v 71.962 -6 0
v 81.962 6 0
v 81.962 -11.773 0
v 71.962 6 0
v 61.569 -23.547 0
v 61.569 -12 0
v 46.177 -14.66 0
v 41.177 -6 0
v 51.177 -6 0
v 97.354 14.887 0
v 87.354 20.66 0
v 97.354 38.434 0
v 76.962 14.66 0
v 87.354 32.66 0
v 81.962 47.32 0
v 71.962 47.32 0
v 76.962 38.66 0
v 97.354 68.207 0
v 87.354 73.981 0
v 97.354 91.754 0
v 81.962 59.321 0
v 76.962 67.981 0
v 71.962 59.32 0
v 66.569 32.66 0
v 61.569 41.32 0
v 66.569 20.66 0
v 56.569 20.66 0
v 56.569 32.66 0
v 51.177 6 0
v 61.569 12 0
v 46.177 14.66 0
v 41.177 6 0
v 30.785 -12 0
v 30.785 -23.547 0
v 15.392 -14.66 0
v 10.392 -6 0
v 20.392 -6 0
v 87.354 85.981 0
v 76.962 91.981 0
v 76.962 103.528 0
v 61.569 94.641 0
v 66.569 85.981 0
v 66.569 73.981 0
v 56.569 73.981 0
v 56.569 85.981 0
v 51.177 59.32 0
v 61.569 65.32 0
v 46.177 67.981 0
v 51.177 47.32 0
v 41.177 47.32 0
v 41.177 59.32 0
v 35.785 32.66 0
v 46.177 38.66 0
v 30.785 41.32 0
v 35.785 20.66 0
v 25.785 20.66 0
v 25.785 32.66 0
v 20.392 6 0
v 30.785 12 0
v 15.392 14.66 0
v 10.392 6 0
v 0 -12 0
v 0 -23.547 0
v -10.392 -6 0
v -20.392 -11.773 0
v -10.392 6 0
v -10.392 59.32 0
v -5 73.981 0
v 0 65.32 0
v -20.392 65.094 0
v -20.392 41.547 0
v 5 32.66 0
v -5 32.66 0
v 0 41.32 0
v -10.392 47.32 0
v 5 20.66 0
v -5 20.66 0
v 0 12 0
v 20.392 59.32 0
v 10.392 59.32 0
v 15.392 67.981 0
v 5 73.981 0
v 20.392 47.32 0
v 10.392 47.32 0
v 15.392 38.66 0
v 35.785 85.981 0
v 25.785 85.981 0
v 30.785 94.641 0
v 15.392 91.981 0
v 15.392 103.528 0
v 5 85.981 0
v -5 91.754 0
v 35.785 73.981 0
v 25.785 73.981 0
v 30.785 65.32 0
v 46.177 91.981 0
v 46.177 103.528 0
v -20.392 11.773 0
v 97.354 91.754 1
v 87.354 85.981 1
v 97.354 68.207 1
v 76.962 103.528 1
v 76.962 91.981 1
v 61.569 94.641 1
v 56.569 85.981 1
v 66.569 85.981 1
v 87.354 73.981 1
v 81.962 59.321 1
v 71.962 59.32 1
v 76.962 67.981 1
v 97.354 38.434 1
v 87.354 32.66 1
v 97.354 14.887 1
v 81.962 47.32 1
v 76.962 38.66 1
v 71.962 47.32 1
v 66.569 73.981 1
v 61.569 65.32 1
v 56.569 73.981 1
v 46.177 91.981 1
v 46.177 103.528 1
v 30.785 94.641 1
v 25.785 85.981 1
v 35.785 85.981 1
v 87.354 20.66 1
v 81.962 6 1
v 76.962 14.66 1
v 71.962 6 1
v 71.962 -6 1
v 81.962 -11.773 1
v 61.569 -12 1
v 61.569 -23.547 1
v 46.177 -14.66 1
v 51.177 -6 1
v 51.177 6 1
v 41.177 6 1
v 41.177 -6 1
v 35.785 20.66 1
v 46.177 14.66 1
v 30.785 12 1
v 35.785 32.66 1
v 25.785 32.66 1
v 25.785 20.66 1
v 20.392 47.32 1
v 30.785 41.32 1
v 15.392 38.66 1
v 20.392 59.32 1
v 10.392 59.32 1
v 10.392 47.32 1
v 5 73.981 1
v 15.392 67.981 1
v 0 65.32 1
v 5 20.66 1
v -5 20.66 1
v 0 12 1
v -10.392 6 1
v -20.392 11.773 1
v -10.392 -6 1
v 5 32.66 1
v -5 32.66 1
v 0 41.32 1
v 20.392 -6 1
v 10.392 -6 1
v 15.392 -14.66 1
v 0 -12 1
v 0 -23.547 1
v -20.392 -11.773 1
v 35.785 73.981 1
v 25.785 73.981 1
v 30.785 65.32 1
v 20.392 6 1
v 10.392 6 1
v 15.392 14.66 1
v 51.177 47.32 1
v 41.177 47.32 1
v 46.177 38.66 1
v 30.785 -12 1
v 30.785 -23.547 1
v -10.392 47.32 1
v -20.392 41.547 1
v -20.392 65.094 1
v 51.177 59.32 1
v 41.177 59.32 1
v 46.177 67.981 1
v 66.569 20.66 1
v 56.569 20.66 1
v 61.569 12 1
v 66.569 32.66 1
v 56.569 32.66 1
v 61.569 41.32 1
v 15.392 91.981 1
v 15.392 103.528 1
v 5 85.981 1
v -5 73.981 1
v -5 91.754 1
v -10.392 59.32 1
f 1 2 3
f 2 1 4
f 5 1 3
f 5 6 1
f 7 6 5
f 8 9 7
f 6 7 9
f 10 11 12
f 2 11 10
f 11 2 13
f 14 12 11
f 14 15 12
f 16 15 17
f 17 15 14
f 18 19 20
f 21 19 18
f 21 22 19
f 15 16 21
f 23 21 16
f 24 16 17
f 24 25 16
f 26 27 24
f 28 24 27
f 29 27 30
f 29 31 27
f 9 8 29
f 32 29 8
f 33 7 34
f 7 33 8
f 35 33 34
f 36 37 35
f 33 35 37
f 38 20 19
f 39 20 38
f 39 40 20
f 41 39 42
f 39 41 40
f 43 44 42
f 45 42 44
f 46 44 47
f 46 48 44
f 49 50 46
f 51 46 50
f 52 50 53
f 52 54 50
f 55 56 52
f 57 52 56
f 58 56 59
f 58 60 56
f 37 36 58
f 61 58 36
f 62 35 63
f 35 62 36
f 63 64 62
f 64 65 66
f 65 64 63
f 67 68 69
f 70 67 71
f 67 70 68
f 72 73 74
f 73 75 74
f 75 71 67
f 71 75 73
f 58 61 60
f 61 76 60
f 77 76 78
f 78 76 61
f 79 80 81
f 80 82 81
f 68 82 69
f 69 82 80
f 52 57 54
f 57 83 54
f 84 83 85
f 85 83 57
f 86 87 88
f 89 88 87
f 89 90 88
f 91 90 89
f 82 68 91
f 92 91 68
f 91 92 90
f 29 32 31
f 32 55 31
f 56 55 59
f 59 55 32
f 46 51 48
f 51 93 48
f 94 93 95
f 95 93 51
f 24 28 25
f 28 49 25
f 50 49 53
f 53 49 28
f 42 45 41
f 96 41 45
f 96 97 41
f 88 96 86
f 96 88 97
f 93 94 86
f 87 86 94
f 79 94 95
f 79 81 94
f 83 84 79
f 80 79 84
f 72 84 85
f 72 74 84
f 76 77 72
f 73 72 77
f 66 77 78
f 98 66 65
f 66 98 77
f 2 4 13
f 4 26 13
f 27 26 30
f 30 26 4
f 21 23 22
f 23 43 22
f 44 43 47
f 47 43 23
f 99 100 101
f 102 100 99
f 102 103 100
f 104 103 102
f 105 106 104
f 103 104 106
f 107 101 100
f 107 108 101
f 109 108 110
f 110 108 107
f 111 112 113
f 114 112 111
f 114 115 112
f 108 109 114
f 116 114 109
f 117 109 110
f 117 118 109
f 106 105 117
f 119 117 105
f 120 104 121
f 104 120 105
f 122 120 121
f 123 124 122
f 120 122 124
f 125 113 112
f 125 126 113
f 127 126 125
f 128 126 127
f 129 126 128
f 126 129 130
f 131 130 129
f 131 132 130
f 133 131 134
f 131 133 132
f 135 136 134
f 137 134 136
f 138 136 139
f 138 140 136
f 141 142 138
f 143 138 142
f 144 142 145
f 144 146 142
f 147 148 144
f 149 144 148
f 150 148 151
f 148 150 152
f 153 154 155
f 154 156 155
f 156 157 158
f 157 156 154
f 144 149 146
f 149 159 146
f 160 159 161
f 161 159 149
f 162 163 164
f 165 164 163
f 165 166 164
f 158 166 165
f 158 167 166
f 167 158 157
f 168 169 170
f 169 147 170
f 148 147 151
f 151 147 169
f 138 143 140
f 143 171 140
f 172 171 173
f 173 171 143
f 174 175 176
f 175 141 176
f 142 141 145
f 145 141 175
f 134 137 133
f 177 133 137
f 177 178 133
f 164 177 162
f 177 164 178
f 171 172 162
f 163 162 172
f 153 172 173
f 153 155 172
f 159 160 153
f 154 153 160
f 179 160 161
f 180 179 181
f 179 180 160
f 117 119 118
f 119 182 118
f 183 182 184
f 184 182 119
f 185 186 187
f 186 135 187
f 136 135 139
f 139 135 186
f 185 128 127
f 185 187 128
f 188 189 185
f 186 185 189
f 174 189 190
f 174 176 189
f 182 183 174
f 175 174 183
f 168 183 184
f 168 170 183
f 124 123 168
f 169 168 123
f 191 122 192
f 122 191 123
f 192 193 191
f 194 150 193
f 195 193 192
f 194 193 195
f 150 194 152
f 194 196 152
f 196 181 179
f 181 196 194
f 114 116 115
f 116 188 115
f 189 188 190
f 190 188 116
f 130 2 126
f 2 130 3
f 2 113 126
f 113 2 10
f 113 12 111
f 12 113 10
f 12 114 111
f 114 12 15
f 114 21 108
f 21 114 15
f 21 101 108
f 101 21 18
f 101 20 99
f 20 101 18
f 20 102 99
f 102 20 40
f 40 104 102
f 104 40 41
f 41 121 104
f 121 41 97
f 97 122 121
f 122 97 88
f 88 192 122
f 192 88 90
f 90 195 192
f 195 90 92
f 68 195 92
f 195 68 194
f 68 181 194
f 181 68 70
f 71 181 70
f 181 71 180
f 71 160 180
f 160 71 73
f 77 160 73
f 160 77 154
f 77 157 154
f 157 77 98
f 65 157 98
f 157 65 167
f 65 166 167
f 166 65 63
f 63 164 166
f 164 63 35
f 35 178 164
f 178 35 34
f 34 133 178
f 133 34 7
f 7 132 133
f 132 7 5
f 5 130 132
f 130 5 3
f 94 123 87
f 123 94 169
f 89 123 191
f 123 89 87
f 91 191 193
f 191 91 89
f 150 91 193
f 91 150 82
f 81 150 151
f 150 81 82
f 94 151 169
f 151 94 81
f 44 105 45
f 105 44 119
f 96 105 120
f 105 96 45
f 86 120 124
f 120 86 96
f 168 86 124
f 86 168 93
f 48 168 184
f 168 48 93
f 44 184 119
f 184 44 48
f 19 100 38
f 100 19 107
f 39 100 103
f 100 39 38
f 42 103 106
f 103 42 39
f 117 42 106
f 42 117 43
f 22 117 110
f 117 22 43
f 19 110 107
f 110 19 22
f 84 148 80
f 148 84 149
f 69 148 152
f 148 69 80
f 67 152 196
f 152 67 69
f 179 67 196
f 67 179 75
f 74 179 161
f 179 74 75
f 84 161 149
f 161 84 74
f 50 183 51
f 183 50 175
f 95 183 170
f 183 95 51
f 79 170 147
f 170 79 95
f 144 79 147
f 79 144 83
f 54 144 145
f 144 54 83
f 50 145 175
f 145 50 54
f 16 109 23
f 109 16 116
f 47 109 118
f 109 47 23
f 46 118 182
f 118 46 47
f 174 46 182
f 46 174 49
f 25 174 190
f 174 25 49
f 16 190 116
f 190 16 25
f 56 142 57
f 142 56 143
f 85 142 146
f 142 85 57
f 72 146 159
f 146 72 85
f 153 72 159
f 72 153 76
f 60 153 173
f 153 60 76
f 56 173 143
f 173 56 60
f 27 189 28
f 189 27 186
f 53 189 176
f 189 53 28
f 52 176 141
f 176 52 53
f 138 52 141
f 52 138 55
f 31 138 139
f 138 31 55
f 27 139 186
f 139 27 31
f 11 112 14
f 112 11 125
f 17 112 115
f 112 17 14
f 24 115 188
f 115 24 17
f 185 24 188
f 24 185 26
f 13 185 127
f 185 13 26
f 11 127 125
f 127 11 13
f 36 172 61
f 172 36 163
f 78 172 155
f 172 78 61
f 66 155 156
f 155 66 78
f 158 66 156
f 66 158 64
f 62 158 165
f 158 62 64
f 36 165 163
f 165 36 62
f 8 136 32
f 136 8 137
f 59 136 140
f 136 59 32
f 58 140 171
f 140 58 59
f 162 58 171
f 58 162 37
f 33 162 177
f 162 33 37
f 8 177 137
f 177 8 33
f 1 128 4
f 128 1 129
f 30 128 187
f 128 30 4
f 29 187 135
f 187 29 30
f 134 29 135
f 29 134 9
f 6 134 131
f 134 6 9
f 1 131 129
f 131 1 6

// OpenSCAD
radius = 12;
latticeWidth = 4;
latticeLength = 3;
spacing = 10;
height = 1;

difference() {   
    linear_extrude(height) {
        for(j = [0:latticeWidth-1]) {
            translate([(((sqrt(3)*radius)+spacing)/2)*(j%2),sqrt(pow((((((sqrt(3)))*radius)+spacing)),2)-(pow(((((sqrt(3)*radius)+spacing))/2),2)))*j,0]) {
                for(i = [0:latticeLength-1]) {
                    translate([((sqrt(3)*radius*i)+spacing*i),0,0]) {
                        rotate([0,0,30]) {
                            circle(((sqrt(3)*radius)+(spacing*2))/sqrt(3), $fn = 6);
                        }
                    }
                }
            }
        }
    }
    linear_extrude(height) {
        for(j = [0:latticeWidth-1]) {
            translate([((sqrt(3)*radius)+spacing)/2*(j%2),sqrt((pow(((sqrt(3)*radius)+spacing),2))-(pow((((sqrt(3)*radius)+spacing))/2,2)))*j,0]) {
                for(i = [0:latticeLength-1]) {
                    translate([(sqrt(3)*radius*i)+spacing*i,0,0]) {
                        rotate([0,0,30]) {
                            circle(radius, $fn = 6);
                        }
                    }
                }
            }
        }
    }
}
